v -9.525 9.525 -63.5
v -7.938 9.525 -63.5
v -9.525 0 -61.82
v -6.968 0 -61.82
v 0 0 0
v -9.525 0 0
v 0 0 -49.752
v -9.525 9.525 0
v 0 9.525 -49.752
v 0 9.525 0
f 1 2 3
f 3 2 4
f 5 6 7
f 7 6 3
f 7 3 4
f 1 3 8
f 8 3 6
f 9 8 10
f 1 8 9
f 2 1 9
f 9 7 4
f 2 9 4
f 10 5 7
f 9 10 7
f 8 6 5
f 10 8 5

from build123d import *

# Parameters (mm, degrees)
BOSS_EXTRUDE1_DEPTH = 9.525
CUT_EXTRUDE1_DEPTH  = 9.525


with BuildPart() as part:
    # Sketch1 → Boss-Extrude1 (new body)
    with BuildSketch(Plane(origin=(0, 0, 0), x_dir=(1, 0, 0), z_dir=(0, 1, 0))):
        Polygon((0, 0), (0, 49.751846715), (-7.9375, 63.5), (-9.525, 63.5), (-9.525, 0), align=None)
    extrude(amount=BOSS_EXTRUDE1_DEPTH)

    # Sketch2 → Cut-Extrude1 (cut)
    with BuildSketch(Plane(origin=(0, 0, 0), x_dir=(0, 0, -1), z_dir=(1, 0, 0))):
        Polygon((63.5, 9.525), (61.820485509, 0), (63.5, 0), align=None)
    extrude(amount=-CUT_EXTRUDE1_DEPTH, mode=Mode.SUBTRACT)


solid = part.part
